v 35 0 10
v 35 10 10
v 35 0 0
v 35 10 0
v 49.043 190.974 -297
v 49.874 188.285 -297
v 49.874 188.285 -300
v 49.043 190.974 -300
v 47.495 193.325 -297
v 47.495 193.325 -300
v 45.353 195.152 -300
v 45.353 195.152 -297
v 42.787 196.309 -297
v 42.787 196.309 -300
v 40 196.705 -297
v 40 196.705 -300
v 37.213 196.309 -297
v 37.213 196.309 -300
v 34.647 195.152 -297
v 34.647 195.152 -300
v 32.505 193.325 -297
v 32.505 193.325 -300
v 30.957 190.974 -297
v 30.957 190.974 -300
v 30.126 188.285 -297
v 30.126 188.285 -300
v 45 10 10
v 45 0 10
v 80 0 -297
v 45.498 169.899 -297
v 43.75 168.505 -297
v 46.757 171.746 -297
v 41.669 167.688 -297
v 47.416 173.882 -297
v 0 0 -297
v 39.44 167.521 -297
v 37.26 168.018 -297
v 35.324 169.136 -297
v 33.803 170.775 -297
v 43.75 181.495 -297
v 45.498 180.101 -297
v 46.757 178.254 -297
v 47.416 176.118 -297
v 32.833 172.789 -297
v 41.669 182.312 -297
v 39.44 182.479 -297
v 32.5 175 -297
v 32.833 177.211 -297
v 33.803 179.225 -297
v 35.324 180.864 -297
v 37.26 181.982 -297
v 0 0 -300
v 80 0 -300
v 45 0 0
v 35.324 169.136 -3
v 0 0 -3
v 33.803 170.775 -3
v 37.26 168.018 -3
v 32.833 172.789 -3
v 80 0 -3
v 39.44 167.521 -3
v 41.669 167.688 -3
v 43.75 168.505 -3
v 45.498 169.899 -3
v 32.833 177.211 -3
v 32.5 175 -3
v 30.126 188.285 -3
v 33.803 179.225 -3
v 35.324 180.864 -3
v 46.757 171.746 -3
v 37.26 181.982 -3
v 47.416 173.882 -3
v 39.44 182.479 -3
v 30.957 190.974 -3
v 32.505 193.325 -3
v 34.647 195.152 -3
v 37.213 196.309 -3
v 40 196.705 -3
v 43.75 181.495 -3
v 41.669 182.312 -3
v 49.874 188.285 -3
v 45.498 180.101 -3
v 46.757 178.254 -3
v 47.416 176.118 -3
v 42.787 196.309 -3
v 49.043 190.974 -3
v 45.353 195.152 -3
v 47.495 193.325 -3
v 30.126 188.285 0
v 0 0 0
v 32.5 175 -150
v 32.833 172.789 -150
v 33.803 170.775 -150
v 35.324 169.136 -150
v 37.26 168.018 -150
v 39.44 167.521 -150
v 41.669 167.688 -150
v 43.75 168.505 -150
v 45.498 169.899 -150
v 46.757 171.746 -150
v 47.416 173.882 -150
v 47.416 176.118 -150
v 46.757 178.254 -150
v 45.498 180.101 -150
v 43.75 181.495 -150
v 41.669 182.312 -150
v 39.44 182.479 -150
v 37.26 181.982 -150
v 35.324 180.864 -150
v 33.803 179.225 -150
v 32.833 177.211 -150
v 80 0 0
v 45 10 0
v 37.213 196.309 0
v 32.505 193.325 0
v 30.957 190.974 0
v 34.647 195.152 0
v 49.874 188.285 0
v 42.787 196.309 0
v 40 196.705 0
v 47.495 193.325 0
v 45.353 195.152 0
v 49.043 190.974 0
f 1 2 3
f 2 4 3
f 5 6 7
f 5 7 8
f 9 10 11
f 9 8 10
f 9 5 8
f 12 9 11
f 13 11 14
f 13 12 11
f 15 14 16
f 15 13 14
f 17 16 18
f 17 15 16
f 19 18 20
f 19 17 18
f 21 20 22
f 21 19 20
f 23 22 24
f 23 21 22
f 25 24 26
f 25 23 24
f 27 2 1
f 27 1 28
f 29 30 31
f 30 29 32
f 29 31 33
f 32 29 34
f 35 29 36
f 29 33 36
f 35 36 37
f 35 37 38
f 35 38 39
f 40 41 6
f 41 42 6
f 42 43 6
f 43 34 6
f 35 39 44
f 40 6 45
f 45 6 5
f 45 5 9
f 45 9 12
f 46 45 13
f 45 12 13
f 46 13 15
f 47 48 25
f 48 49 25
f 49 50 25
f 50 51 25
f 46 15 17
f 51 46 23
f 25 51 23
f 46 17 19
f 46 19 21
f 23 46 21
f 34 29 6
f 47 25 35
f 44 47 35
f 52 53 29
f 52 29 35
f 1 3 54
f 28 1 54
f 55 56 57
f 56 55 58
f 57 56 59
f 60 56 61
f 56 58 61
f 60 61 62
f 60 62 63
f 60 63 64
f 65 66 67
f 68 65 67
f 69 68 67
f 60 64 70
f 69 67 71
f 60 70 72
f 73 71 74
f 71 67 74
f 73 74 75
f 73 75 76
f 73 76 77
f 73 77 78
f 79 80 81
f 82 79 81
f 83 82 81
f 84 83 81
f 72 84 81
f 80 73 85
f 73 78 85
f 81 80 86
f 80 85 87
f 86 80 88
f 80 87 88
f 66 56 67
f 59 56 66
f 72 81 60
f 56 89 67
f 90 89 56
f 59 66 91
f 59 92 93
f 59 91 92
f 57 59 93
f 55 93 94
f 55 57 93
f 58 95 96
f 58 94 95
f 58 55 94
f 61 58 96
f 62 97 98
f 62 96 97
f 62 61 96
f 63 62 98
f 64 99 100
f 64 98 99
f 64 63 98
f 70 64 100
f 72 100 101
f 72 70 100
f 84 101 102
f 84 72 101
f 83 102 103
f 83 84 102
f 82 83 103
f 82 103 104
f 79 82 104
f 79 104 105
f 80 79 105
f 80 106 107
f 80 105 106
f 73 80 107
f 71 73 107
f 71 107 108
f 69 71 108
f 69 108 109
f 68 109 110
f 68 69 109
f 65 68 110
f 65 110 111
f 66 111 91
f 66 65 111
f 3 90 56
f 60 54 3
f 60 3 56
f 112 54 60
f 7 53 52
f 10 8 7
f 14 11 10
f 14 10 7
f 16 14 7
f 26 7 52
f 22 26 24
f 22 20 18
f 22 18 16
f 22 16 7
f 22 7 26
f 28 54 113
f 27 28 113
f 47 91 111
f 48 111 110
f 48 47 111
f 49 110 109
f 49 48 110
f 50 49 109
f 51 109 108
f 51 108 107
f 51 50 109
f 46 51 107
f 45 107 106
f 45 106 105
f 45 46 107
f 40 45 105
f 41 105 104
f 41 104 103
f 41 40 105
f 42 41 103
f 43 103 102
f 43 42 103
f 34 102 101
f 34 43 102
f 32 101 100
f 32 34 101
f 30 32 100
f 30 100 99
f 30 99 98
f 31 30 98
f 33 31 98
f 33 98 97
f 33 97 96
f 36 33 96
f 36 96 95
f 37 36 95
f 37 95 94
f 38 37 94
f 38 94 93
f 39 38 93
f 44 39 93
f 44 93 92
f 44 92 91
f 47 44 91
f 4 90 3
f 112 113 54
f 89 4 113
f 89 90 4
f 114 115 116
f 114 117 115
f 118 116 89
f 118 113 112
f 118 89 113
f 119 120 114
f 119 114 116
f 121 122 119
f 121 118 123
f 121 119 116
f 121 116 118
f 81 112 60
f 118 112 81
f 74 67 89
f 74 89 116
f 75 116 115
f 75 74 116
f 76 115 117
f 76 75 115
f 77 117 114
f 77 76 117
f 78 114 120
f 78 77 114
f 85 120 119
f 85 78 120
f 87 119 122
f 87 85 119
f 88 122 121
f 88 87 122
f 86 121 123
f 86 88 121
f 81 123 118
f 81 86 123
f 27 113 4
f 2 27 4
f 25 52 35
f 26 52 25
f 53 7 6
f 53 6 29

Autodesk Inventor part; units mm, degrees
ref_plane "YZ Plane" through (0, 0, 0) normal (1, 0, 0) x (0, 1, 0)
ref_plane "XZ Plane" through (0, 0, 0) normal (0, 1, 0) x (-1, 0, 0)
ref_plane "XY Plane" through (0, 0, 0) normal (0, 0, 1) x (1, 0, 0)
sketch "Sketch1" plane through (0, 0, 0) normal (0, 0, 1) x (1, 0, 0)
  point P0 (0, 0)
sketch "Sketch2" plane through (0, 0, 0) normal (0, 0, 1) x (1, 0, 0)
  line L0 (0, 0) -> (80, 0)
  line L1 (80, 0) -> (40, 250)
  line L2 (40, 250) -> (0, 0)
  dimension "d0" = 80
  dimension "d1" = 250
  dimension "d2" = 40
extrude "Extrusion1" add sketch "Sketch2" against normal blind 3
sketch "Sketch3" plane through (0, 0, -3) normal (0, 0, -1) x (-1, 0, 0)
  circle A0 centre (-40, 175) radius 7.5
  line L0 (-80, 0) -> (0, 0) projected
  point P0 (-40, 250)
  point P1 (-40, 0)
  dimension "d5" = 15
  dimension "d6" = 0
  dimension "d7" = 175
fillet "Fillet1" radius 10 1 edges at (40, 250, -1.5)
extrude "Extrusion2" add sketch "Sketch3" along normal blind 147
mirror "Mirror1" about plane through (40, 175, -150) normal (0, 0, -1) of "Extrusion2", "Extrusion1"
fillet "Fillet2" radius 10 1 edges at (40, 250, -298.5)
sketch "Sketch8" plane through (0, 0, 0) normal (0, 0, 1) x (1, 0, 0)
  line L0 (0, 0) -> (80, 0) projected
  line L1 (35, 0) -> (45, 0)
  line L2 (45, 0) -> (45, 10)
  line L3 (45, 10) -> (35, 10)
  line L4 (35, 10) -> (35, 0)
  point P0 (40, 0)
  point P1 (40, 10)
  point P2 (35, 5)
  dimension "d30" = 10
  dimension "d31" = 10
  dimension "d32" = 35
extrude "Extrusion7" add sketch "Sketch8" along normal blind 10
properties part number "stand"
